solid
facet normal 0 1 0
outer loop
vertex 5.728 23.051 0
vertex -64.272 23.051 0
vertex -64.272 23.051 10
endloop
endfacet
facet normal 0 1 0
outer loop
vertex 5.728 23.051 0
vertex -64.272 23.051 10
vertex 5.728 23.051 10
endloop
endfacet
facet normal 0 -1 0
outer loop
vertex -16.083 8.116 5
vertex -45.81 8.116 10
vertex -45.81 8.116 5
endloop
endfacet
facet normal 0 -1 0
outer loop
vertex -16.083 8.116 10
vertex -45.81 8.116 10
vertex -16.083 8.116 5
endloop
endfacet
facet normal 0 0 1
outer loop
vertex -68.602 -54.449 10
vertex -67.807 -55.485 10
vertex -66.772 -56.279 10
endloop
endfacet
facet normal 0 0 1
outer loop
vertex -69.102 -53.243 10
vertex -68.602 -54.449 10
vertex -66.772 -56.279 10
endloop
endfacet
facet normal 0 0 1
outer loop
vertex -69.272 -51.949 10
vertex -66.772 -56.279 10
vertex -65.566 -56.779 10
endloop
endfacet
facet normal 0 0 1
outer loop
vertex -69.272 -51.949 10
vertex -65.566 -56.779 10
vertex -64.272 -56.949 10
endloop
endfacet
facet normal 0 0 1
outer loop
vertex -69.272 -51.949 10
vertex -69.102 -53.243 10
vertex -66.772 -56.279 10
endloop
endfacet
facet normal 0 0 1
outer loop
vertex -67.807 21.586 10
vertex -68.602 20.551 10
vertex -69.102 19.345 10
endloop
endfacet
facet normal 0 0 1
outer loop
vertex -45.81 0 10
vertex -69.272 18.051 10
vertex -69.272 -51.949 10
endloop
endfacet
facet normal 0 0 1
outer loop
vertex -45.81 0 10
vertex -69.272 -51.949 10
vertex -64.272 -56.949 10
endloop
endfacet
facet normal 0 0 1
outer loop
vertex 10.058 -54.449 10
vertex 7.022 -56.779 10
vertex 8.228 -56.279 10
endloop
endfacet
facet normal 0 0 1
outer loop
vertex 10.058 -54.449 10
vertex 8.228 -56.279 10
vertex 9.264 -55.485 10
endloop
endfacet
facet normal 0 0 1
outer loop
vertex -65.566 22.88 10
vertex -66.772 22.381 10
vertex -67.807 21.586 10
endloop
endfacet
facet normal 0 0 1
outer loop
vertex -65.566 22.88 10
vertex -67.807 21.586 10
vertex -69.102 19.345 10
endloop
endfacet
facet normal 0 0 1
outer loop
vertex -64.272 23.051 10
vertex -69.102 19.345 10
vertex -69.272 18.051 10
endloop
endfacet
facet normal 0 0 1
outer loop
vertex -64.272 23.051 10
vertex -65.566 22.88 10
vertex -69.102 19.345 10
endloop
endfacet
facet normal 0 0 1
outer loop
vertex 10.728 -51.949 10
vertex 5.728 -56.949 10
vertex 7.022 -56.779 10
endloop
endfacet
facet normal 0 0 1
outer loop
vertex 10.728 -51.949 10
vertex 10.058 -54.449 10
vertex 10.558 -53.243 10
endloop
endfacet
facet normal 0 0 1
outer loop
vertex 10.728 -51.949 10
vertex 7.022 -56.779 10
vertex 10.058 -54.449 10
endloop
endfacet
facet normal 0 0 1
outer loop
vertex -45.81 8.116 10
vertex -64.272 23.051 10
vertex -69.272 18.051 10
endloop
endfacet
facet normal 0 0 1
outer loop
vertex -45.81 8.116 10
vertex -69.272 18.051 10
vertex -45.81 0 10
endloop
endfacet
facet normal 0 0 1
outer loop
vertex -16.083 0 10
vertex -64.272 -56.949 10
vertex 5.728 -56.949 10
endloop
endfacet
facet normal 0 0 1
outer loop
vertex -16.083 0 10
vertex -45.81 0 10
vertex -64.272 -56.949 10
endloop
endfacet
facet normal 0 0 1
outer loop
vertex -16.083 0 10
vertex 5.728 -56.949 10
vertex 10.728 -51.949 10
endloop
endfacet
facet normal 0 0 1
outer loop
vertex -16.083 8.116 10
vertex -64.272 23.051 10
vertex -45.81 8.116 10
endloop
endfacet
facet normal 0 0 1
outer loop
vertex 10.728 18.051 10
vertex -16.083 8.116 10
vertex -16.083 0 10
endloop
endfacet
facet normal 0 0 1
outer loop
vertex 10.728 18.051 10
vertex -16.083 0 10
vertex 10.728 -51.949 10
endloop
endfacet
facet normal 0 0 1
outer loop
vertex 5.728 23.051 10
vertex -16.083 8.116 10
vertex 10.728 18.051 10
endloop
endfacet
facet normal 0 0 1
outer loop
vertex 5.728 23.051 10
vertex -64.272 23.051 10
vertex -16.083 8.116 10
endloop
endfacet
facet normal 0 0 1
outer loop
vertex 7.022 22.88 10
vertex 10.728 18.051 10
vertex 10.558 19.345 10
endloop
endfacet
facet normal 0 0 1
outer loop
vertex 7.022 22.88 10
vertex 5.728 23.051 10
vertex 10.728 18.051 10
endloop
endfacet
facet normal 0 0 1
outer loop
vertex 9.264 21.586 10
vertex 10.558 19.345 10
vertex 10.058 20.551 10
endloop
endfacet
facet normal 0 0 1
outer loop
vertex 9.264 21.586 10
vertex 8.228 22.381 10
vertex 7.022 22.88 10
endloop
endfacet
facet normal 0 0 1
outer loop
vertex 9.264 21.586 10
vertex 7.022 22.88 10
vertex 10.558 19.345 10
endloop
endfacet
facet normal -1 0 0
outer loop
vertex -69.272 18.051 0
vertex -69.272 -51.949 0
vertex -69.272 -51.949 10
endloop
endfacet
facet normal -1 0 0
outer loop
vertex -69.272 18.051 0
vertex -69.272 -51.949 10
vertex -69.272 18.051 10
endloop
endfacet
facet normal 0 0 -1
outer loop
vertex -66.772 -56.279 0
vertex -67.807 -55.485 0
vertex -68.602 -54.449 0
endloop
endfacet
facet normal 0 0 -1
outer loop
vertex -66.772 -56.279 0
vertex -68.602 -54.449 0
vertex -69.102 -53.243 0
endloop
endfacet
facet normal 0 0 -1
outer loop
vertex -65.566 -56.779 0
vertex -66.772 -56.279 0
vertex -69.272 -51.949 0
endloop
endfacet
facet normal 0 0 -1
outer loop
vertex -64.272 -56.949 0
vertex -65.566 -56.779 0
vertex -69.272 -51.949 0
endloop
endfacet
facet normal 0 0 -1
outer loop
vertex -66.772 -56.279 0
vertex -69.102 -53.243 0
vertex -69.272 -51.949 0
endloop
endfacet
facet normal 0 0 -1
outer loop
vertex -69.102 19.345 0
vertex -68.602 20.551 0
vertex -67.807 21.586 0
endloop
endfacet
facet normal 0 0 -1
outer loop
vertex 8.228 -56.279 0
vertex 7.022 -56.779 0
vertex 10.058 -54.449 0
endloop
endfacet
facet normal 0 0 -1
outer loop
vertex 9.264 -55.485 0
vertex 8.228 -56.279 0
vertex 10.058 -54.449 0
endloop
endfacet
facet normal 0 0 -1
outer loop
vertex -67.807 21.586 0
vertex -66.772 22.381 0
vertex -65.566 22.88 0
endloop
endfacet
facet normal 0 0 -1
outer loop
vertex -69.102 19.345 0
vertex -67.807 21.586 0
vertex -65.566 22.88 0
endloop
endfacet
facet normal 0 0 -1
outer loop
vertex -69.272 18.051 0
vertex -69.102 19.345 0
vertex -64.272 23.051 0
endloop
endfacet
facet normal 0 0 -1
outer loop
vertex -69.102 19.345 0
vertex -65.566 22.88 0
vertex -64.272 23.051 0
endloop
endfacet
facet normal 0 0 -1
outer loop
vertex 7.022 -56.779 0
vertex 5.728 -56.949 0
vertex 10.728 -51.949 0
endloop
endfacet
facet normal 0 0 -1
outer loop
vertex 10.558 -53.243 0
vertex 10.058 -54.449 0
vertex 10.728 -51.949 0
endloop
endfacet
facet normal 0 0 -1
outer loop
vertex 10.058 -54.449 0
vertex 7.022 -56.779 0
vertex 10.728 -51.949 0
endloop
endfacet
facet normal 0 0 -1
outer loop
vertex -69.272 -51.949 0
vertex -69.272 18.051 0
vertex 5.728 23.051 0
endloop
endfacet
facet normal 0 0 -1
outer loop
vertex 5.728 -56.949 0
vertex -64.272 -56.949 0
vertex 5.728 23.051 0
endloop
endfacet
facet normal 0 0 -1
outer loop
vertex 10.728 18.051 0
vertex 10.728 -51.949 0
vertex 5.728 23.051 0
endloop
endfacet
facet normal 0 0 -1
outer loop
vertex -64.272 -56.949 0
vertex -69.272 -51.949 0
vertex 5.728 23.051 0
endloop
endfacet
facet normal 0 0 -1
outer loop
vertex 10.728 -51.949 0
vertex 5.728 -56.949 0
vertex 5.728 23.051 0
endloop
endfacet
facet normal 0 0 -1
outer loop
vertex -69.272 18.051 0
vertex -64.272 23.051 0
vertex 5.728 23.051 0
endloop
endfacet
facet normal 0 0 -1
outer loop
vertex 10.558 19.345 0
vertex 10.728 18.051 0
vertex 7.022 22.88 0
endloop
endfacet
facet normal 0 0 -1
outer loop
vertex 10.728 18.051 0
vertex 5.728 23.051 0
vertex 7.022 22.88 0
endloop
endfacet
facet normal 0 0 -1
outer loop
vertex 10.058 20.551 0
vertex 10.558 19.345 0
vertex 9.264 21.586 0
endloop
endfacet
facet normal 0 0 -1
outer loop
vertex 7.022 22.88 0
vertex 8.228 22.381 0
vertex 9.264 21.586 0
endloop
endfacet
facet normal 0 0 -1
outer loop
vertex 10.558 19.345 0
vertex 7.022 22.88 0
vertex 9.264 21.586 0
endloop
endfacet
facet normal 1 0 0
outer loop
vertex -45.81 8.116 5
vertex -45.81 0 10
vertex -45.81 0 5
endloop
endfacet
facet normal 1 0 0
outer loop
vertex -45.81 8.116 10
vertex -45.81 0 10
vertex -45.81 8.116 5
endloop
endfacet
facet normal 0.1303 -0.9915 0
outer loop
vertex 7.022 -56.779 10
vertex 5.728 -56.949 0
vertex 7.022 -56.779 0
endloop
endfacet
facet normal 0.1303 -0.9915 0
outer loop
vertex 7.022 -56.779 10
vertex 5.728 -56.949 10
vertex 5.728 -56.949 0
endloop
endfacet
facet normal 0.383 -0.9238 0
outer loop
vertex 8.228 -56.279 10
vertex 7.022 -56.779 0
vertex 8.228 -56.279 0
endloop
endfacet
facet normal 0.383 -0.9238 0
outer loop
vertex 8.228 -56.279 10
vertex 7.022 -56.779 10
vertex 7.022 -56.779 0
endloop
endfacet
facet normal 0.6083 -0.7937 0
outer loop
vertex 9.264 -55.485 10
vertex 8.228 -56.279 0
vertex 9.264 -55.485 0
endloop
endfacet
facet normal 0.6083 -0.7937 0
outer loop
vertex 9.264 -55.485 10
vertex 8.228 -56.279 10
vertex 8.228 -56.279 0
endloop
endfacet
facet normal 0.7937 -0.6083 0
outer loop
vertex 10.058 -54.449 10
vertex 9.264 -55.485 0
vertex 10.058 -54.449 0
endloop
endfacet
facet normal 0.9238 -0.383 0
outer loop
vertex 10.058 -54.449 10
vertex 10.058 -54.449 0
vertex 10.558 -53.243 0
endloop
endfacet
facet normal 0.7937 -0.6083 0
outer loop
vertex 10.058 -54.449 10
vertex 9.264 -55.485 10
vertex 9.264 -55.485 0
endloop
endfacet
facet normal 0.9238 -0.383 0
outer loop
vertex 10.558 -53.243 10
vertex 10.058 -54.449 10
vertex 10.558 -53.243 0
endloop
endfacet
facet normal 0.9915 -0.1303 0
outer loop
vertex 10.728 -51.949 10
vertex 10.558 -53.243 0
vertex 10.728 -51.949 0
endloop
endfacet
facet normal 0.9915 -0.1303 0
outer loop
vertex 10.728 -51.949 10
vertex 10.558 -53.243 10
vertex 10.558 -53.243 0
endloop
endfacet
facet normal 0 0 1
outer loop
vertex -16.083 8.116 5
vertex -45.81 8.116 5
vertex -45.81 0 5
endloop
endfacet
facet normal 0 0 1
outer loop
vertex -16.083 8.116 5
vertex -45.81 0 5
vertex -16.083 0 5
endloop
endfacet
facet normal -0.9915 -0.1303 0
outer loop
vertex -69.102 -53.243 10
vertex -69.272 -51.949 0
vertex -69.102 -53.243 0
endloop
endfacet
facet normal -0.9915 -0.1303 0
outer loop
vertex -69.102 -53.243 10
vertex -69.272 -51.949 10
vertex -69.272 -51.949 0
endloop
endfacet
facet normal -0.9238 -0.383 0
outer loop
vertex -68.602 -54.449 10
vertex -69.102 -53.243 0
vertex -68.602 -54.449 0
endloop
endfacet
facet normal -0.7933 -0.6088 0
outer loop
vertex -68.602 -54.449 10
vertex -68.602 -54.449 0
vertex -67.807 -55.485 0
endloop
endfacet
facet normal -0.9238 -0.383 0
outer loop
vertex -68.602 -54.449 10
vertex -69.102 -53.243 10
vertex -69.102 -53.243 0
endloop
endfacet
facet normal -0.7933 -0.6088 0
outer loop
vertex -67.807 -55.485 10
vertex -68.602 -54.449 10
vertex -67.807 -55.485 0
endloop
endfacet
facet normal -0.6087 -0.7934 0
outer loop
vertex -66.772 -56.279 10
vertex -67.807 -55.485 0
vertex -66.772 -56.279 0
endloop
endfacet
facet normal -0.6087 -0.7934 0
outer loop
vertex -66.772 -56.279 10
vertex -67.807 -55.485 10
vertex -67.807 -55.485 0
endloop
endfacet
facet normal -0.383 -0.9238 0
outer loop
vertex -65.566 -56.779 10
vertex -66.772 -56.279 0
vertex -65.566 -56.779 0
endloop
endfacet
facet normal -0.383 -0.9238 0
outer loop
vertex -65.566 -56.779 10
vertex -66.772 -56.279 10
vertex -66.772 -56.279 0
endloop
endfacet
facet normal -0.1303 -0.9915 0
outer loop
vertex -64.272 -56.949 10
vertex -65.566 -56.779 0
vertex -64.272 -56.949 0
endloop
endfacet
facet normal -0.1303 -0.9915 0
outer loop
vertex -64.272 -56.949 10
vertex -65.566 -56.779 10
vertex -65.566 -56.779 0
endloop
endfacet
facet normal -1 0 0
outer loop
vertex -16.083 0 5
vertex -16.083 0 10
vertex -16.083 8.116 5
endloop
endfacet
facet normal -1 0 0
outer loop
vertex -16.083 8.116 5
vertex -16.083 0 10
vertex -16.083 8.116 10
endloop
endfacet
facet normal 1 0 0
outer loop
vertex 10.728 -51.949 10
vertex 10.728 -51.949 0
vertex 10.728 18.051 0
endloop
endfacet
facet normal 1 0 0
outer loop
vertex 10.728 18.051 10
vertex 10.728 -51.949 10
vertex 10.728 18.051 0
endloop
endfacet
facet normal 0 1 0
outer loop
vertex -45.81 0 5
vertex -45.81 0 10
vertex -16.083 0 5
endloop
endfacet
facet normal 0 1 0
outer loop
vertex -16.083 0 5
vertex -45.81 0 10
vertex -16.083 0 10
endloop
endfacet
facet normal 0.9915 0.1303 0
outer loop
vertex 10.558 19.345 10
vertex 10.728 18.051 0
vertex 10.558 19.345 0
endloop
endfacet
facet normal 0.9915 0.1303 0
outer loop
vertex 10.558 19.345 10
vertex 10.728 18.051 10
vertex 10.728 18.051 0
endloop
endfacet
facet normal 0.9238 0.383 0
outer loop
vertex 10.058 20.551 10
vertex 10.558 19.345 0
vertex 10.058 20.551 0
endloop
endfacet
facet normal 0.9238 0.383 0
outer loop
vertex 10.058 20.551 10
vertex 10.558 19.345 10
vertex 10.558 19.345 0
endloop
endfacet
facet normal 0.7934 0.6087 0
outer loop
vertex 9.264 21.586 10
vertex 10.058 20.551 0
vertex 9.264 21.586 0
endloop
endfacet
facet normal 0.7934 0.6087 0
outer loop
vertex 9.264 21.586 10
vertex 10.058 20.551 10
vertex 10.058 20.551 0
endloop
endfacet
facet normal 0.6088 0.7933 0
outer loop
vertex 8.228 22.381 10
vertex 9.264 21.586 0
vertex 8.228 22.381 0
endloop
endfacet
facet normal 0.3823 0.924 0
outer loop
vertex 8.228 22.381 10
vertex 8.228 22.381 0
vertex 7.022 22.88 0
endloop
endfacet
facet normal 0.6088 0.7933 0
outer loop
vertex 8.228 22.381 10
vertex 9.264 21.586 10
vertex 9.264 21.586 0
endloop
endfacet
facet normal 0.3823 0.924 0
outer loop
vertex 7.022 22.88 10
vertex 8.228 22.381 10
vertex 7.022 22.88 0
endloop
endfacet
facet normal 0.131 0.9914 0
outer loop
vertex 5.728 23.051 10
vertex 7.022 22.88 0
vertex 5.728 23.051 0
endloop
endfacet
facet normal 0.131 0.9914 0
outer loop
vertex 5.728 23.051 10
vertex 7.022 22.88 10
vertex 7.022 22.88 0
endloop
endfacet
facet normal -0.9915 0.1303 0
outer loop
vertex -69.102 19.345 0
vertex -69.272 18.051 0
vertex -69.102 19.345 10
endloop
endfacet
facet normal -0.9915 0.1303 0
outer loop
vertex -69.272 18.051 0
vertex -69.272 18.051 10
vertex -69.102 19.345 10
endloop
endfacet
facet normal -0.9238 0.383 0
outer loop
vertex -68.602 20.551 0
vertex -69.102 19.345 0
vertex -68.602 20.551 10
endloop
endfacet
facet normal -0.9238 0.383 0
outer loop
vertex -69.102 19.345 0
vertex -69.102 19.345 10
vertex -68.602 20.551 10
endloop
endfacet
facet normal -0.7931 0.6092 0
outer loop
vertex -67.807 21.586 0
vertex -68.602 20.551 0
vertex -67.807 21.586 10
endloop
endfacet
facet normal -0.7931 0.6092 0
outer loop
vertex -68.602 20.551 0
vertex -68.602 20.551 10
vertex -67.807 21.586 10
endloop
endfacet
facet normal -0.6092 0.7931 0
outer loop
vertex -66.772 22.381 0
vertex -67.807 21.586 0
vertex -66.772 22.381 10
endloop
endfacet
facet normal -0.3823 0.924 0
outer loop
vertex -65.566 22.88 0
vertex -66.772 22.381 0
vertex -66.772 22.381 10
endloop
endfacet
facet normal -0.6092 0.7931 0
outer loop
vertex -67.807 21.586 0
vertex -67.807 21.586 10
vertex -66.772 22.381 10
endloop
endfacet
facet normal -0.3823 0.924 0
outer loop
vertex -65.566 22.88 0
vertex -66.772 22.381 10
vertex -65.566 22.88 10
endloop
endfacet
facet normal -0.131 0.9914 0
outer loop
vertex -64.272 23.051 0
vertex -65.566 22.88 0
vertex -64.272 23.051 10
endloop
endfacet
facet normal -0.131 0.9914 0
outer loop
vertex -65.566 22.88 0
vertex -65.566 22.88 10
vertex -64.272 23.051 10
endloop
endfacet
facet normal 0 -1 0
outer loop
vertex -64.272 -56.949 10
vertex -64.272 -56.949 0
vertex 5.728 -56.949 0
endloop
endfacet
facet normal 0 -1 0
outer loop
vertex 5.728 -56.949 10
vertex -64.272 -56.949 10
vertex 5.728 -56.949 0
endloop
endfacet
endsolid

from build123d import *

# Parameters (mm, degrees)
F0_W     = 80
F0_H     = 80
F1_DEPTH = 10
F2_R     = 5
F3_W     = 29.726662
F3_H     = 8.11574
F4_DEPTH = 5


with BuildPart() as f1:
    # F0 (on Top) → F1 (new body)
    with BuildSketch(Plane.XY):
        with Locations((-29.271951, -16.949144)):
            Rectangle(F0_W, F0_H)
    extrude(amount=F1_DEPTH)

    # F2
    f2_edges = [f1.edges().sort_by_distance(p)[0] for p in [
        (-69.271951, 23.050856, 5),
        (-69.271951, -56.949144, 5),
        (10.728049, -56.949144, 5),
        (10.728049, 23.050856, 5),
    ]]
    fillet(f2_edges, radius=F2_R)

    # F3 (on face) → F4 (cut)
    with BuildSketch(Plane.XY.offset(10)):
        with Locations((-30.946564, 4.05787)):
            Rectangle(F3_W, F3_H)
    extrude(amount=-F4_DEPTH, mode=Mode.SUBTRACT)


solid = f1.part
